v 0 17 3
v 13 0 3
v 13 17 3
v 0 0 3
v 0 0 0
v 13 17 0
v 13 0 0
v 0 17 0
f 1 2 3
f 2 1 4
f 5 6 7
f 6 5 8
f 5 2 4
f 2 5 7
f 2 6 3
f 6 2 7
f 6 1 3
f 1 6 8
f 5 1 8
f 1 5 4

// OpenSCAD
// Generated by SolidPython 1.0.1 on 2020-07-29 00:46:55


cube(size = [13, 17, 3]);
/***********************************************
*********      SolidPython code:      **********
************************************************
 
# import packages: SolidPython
from solid import *
from solid.utils import *
from itertools import chain, combinations, permutations


class Resize:

    def __init__(self, scad_file):
        self.scad_file = scad_file
        #self.scad_file = import_scad(scad_file)
        # cone/cylinder param:
        self.r1 = 0
        self.r2 = 0
        self.h = 0
        # rectangular prism param:
        self.w = 0
        self.l = 0
        # ellipse param:
        self.r = 0

    # import OpenScad code (file name corresponds to shape)


    # classify shape + parameters
    def assign(self, param1, param2, param3):
        if self.scad_file == 'cone.scad':
            self.r1 = param1
            self.r2 = param2
            self.h = param3
        elif self.scad_file == 'cylinder.scad':
            self.r1 = param1
            self.r2 = param2
            self.h = param3
        elif self.scad_file == 'rectangularPrism.scad':
            self.h = param1
            self.l = param2
            self.w = param3
        else:
            self.r = param1
            self.h = param2

    # resize parameters
    def iterate(self):
        x = range(3, 20, 2)
        i = 1
        if self.scad_file == 'cone.scad':
            tempList = list(permutations(x, 2))
            for temp in tempList:
                param1 = temp[0]
                param2 = temp[1]
                filepath = 'produced_scad_files/' + 'cone' + str(param1) + '_' + str(param2) + '_' + '.scad'
                scad_render_to_file(cylinder(h=param1, r1=param2, r2=0), filepath)

        elif self.scad_file == 'cylinder.scad':
            tempList = list(permutations(x, 3))
            for temp in tempList:
                param1 = temp[0]
                param2 = temp[1]
                filepath = 'produced_scad_files/' + 'cylinder' + str(param1) + '_' + str(param2) + '_' + '.scad'
                scad_render_to_file(cylinder(h=param1, r1=param2, r2=param2), filepath)

        elif self.scad_file == 'rectangularPrism.scad':
            tempList = list(permutations(x, 3))
            for temp in tempList:
                param1 = temp[0]
                param2 = temp[1]
                param3 = temp[2]
                filepath = 'produced_scad_files/' + 'rectangularPrism' + str(param1) + '_' + str(param2) + '_' + str(
                    param3) + '.scad'
                scad_render_to_file(cube(size=(param1, param2, param3)), filepath)

        elif self.scad_file == 'ellipse.scad':
            tempList = list(permutations(x, 4))
            for temp in tempList:
                param1 = temp[0]
                param2 = temp[1]
                param3 = temp[2]
                param4 = temp[3]
                filepath = 'produced_scad_files/' + 'ellipse' + str(param1) + '_' + str(param2) + '_' + str(param3) + '_' + str(param4) + '.scad'
                scad_render_to_file(scale([param1, param2, param3])(sphere(r=param4)), filepath)

    def render_to_scadfile(self):
        scad_render_to_file(scad, 'example.scad') 
 
************************************************/
